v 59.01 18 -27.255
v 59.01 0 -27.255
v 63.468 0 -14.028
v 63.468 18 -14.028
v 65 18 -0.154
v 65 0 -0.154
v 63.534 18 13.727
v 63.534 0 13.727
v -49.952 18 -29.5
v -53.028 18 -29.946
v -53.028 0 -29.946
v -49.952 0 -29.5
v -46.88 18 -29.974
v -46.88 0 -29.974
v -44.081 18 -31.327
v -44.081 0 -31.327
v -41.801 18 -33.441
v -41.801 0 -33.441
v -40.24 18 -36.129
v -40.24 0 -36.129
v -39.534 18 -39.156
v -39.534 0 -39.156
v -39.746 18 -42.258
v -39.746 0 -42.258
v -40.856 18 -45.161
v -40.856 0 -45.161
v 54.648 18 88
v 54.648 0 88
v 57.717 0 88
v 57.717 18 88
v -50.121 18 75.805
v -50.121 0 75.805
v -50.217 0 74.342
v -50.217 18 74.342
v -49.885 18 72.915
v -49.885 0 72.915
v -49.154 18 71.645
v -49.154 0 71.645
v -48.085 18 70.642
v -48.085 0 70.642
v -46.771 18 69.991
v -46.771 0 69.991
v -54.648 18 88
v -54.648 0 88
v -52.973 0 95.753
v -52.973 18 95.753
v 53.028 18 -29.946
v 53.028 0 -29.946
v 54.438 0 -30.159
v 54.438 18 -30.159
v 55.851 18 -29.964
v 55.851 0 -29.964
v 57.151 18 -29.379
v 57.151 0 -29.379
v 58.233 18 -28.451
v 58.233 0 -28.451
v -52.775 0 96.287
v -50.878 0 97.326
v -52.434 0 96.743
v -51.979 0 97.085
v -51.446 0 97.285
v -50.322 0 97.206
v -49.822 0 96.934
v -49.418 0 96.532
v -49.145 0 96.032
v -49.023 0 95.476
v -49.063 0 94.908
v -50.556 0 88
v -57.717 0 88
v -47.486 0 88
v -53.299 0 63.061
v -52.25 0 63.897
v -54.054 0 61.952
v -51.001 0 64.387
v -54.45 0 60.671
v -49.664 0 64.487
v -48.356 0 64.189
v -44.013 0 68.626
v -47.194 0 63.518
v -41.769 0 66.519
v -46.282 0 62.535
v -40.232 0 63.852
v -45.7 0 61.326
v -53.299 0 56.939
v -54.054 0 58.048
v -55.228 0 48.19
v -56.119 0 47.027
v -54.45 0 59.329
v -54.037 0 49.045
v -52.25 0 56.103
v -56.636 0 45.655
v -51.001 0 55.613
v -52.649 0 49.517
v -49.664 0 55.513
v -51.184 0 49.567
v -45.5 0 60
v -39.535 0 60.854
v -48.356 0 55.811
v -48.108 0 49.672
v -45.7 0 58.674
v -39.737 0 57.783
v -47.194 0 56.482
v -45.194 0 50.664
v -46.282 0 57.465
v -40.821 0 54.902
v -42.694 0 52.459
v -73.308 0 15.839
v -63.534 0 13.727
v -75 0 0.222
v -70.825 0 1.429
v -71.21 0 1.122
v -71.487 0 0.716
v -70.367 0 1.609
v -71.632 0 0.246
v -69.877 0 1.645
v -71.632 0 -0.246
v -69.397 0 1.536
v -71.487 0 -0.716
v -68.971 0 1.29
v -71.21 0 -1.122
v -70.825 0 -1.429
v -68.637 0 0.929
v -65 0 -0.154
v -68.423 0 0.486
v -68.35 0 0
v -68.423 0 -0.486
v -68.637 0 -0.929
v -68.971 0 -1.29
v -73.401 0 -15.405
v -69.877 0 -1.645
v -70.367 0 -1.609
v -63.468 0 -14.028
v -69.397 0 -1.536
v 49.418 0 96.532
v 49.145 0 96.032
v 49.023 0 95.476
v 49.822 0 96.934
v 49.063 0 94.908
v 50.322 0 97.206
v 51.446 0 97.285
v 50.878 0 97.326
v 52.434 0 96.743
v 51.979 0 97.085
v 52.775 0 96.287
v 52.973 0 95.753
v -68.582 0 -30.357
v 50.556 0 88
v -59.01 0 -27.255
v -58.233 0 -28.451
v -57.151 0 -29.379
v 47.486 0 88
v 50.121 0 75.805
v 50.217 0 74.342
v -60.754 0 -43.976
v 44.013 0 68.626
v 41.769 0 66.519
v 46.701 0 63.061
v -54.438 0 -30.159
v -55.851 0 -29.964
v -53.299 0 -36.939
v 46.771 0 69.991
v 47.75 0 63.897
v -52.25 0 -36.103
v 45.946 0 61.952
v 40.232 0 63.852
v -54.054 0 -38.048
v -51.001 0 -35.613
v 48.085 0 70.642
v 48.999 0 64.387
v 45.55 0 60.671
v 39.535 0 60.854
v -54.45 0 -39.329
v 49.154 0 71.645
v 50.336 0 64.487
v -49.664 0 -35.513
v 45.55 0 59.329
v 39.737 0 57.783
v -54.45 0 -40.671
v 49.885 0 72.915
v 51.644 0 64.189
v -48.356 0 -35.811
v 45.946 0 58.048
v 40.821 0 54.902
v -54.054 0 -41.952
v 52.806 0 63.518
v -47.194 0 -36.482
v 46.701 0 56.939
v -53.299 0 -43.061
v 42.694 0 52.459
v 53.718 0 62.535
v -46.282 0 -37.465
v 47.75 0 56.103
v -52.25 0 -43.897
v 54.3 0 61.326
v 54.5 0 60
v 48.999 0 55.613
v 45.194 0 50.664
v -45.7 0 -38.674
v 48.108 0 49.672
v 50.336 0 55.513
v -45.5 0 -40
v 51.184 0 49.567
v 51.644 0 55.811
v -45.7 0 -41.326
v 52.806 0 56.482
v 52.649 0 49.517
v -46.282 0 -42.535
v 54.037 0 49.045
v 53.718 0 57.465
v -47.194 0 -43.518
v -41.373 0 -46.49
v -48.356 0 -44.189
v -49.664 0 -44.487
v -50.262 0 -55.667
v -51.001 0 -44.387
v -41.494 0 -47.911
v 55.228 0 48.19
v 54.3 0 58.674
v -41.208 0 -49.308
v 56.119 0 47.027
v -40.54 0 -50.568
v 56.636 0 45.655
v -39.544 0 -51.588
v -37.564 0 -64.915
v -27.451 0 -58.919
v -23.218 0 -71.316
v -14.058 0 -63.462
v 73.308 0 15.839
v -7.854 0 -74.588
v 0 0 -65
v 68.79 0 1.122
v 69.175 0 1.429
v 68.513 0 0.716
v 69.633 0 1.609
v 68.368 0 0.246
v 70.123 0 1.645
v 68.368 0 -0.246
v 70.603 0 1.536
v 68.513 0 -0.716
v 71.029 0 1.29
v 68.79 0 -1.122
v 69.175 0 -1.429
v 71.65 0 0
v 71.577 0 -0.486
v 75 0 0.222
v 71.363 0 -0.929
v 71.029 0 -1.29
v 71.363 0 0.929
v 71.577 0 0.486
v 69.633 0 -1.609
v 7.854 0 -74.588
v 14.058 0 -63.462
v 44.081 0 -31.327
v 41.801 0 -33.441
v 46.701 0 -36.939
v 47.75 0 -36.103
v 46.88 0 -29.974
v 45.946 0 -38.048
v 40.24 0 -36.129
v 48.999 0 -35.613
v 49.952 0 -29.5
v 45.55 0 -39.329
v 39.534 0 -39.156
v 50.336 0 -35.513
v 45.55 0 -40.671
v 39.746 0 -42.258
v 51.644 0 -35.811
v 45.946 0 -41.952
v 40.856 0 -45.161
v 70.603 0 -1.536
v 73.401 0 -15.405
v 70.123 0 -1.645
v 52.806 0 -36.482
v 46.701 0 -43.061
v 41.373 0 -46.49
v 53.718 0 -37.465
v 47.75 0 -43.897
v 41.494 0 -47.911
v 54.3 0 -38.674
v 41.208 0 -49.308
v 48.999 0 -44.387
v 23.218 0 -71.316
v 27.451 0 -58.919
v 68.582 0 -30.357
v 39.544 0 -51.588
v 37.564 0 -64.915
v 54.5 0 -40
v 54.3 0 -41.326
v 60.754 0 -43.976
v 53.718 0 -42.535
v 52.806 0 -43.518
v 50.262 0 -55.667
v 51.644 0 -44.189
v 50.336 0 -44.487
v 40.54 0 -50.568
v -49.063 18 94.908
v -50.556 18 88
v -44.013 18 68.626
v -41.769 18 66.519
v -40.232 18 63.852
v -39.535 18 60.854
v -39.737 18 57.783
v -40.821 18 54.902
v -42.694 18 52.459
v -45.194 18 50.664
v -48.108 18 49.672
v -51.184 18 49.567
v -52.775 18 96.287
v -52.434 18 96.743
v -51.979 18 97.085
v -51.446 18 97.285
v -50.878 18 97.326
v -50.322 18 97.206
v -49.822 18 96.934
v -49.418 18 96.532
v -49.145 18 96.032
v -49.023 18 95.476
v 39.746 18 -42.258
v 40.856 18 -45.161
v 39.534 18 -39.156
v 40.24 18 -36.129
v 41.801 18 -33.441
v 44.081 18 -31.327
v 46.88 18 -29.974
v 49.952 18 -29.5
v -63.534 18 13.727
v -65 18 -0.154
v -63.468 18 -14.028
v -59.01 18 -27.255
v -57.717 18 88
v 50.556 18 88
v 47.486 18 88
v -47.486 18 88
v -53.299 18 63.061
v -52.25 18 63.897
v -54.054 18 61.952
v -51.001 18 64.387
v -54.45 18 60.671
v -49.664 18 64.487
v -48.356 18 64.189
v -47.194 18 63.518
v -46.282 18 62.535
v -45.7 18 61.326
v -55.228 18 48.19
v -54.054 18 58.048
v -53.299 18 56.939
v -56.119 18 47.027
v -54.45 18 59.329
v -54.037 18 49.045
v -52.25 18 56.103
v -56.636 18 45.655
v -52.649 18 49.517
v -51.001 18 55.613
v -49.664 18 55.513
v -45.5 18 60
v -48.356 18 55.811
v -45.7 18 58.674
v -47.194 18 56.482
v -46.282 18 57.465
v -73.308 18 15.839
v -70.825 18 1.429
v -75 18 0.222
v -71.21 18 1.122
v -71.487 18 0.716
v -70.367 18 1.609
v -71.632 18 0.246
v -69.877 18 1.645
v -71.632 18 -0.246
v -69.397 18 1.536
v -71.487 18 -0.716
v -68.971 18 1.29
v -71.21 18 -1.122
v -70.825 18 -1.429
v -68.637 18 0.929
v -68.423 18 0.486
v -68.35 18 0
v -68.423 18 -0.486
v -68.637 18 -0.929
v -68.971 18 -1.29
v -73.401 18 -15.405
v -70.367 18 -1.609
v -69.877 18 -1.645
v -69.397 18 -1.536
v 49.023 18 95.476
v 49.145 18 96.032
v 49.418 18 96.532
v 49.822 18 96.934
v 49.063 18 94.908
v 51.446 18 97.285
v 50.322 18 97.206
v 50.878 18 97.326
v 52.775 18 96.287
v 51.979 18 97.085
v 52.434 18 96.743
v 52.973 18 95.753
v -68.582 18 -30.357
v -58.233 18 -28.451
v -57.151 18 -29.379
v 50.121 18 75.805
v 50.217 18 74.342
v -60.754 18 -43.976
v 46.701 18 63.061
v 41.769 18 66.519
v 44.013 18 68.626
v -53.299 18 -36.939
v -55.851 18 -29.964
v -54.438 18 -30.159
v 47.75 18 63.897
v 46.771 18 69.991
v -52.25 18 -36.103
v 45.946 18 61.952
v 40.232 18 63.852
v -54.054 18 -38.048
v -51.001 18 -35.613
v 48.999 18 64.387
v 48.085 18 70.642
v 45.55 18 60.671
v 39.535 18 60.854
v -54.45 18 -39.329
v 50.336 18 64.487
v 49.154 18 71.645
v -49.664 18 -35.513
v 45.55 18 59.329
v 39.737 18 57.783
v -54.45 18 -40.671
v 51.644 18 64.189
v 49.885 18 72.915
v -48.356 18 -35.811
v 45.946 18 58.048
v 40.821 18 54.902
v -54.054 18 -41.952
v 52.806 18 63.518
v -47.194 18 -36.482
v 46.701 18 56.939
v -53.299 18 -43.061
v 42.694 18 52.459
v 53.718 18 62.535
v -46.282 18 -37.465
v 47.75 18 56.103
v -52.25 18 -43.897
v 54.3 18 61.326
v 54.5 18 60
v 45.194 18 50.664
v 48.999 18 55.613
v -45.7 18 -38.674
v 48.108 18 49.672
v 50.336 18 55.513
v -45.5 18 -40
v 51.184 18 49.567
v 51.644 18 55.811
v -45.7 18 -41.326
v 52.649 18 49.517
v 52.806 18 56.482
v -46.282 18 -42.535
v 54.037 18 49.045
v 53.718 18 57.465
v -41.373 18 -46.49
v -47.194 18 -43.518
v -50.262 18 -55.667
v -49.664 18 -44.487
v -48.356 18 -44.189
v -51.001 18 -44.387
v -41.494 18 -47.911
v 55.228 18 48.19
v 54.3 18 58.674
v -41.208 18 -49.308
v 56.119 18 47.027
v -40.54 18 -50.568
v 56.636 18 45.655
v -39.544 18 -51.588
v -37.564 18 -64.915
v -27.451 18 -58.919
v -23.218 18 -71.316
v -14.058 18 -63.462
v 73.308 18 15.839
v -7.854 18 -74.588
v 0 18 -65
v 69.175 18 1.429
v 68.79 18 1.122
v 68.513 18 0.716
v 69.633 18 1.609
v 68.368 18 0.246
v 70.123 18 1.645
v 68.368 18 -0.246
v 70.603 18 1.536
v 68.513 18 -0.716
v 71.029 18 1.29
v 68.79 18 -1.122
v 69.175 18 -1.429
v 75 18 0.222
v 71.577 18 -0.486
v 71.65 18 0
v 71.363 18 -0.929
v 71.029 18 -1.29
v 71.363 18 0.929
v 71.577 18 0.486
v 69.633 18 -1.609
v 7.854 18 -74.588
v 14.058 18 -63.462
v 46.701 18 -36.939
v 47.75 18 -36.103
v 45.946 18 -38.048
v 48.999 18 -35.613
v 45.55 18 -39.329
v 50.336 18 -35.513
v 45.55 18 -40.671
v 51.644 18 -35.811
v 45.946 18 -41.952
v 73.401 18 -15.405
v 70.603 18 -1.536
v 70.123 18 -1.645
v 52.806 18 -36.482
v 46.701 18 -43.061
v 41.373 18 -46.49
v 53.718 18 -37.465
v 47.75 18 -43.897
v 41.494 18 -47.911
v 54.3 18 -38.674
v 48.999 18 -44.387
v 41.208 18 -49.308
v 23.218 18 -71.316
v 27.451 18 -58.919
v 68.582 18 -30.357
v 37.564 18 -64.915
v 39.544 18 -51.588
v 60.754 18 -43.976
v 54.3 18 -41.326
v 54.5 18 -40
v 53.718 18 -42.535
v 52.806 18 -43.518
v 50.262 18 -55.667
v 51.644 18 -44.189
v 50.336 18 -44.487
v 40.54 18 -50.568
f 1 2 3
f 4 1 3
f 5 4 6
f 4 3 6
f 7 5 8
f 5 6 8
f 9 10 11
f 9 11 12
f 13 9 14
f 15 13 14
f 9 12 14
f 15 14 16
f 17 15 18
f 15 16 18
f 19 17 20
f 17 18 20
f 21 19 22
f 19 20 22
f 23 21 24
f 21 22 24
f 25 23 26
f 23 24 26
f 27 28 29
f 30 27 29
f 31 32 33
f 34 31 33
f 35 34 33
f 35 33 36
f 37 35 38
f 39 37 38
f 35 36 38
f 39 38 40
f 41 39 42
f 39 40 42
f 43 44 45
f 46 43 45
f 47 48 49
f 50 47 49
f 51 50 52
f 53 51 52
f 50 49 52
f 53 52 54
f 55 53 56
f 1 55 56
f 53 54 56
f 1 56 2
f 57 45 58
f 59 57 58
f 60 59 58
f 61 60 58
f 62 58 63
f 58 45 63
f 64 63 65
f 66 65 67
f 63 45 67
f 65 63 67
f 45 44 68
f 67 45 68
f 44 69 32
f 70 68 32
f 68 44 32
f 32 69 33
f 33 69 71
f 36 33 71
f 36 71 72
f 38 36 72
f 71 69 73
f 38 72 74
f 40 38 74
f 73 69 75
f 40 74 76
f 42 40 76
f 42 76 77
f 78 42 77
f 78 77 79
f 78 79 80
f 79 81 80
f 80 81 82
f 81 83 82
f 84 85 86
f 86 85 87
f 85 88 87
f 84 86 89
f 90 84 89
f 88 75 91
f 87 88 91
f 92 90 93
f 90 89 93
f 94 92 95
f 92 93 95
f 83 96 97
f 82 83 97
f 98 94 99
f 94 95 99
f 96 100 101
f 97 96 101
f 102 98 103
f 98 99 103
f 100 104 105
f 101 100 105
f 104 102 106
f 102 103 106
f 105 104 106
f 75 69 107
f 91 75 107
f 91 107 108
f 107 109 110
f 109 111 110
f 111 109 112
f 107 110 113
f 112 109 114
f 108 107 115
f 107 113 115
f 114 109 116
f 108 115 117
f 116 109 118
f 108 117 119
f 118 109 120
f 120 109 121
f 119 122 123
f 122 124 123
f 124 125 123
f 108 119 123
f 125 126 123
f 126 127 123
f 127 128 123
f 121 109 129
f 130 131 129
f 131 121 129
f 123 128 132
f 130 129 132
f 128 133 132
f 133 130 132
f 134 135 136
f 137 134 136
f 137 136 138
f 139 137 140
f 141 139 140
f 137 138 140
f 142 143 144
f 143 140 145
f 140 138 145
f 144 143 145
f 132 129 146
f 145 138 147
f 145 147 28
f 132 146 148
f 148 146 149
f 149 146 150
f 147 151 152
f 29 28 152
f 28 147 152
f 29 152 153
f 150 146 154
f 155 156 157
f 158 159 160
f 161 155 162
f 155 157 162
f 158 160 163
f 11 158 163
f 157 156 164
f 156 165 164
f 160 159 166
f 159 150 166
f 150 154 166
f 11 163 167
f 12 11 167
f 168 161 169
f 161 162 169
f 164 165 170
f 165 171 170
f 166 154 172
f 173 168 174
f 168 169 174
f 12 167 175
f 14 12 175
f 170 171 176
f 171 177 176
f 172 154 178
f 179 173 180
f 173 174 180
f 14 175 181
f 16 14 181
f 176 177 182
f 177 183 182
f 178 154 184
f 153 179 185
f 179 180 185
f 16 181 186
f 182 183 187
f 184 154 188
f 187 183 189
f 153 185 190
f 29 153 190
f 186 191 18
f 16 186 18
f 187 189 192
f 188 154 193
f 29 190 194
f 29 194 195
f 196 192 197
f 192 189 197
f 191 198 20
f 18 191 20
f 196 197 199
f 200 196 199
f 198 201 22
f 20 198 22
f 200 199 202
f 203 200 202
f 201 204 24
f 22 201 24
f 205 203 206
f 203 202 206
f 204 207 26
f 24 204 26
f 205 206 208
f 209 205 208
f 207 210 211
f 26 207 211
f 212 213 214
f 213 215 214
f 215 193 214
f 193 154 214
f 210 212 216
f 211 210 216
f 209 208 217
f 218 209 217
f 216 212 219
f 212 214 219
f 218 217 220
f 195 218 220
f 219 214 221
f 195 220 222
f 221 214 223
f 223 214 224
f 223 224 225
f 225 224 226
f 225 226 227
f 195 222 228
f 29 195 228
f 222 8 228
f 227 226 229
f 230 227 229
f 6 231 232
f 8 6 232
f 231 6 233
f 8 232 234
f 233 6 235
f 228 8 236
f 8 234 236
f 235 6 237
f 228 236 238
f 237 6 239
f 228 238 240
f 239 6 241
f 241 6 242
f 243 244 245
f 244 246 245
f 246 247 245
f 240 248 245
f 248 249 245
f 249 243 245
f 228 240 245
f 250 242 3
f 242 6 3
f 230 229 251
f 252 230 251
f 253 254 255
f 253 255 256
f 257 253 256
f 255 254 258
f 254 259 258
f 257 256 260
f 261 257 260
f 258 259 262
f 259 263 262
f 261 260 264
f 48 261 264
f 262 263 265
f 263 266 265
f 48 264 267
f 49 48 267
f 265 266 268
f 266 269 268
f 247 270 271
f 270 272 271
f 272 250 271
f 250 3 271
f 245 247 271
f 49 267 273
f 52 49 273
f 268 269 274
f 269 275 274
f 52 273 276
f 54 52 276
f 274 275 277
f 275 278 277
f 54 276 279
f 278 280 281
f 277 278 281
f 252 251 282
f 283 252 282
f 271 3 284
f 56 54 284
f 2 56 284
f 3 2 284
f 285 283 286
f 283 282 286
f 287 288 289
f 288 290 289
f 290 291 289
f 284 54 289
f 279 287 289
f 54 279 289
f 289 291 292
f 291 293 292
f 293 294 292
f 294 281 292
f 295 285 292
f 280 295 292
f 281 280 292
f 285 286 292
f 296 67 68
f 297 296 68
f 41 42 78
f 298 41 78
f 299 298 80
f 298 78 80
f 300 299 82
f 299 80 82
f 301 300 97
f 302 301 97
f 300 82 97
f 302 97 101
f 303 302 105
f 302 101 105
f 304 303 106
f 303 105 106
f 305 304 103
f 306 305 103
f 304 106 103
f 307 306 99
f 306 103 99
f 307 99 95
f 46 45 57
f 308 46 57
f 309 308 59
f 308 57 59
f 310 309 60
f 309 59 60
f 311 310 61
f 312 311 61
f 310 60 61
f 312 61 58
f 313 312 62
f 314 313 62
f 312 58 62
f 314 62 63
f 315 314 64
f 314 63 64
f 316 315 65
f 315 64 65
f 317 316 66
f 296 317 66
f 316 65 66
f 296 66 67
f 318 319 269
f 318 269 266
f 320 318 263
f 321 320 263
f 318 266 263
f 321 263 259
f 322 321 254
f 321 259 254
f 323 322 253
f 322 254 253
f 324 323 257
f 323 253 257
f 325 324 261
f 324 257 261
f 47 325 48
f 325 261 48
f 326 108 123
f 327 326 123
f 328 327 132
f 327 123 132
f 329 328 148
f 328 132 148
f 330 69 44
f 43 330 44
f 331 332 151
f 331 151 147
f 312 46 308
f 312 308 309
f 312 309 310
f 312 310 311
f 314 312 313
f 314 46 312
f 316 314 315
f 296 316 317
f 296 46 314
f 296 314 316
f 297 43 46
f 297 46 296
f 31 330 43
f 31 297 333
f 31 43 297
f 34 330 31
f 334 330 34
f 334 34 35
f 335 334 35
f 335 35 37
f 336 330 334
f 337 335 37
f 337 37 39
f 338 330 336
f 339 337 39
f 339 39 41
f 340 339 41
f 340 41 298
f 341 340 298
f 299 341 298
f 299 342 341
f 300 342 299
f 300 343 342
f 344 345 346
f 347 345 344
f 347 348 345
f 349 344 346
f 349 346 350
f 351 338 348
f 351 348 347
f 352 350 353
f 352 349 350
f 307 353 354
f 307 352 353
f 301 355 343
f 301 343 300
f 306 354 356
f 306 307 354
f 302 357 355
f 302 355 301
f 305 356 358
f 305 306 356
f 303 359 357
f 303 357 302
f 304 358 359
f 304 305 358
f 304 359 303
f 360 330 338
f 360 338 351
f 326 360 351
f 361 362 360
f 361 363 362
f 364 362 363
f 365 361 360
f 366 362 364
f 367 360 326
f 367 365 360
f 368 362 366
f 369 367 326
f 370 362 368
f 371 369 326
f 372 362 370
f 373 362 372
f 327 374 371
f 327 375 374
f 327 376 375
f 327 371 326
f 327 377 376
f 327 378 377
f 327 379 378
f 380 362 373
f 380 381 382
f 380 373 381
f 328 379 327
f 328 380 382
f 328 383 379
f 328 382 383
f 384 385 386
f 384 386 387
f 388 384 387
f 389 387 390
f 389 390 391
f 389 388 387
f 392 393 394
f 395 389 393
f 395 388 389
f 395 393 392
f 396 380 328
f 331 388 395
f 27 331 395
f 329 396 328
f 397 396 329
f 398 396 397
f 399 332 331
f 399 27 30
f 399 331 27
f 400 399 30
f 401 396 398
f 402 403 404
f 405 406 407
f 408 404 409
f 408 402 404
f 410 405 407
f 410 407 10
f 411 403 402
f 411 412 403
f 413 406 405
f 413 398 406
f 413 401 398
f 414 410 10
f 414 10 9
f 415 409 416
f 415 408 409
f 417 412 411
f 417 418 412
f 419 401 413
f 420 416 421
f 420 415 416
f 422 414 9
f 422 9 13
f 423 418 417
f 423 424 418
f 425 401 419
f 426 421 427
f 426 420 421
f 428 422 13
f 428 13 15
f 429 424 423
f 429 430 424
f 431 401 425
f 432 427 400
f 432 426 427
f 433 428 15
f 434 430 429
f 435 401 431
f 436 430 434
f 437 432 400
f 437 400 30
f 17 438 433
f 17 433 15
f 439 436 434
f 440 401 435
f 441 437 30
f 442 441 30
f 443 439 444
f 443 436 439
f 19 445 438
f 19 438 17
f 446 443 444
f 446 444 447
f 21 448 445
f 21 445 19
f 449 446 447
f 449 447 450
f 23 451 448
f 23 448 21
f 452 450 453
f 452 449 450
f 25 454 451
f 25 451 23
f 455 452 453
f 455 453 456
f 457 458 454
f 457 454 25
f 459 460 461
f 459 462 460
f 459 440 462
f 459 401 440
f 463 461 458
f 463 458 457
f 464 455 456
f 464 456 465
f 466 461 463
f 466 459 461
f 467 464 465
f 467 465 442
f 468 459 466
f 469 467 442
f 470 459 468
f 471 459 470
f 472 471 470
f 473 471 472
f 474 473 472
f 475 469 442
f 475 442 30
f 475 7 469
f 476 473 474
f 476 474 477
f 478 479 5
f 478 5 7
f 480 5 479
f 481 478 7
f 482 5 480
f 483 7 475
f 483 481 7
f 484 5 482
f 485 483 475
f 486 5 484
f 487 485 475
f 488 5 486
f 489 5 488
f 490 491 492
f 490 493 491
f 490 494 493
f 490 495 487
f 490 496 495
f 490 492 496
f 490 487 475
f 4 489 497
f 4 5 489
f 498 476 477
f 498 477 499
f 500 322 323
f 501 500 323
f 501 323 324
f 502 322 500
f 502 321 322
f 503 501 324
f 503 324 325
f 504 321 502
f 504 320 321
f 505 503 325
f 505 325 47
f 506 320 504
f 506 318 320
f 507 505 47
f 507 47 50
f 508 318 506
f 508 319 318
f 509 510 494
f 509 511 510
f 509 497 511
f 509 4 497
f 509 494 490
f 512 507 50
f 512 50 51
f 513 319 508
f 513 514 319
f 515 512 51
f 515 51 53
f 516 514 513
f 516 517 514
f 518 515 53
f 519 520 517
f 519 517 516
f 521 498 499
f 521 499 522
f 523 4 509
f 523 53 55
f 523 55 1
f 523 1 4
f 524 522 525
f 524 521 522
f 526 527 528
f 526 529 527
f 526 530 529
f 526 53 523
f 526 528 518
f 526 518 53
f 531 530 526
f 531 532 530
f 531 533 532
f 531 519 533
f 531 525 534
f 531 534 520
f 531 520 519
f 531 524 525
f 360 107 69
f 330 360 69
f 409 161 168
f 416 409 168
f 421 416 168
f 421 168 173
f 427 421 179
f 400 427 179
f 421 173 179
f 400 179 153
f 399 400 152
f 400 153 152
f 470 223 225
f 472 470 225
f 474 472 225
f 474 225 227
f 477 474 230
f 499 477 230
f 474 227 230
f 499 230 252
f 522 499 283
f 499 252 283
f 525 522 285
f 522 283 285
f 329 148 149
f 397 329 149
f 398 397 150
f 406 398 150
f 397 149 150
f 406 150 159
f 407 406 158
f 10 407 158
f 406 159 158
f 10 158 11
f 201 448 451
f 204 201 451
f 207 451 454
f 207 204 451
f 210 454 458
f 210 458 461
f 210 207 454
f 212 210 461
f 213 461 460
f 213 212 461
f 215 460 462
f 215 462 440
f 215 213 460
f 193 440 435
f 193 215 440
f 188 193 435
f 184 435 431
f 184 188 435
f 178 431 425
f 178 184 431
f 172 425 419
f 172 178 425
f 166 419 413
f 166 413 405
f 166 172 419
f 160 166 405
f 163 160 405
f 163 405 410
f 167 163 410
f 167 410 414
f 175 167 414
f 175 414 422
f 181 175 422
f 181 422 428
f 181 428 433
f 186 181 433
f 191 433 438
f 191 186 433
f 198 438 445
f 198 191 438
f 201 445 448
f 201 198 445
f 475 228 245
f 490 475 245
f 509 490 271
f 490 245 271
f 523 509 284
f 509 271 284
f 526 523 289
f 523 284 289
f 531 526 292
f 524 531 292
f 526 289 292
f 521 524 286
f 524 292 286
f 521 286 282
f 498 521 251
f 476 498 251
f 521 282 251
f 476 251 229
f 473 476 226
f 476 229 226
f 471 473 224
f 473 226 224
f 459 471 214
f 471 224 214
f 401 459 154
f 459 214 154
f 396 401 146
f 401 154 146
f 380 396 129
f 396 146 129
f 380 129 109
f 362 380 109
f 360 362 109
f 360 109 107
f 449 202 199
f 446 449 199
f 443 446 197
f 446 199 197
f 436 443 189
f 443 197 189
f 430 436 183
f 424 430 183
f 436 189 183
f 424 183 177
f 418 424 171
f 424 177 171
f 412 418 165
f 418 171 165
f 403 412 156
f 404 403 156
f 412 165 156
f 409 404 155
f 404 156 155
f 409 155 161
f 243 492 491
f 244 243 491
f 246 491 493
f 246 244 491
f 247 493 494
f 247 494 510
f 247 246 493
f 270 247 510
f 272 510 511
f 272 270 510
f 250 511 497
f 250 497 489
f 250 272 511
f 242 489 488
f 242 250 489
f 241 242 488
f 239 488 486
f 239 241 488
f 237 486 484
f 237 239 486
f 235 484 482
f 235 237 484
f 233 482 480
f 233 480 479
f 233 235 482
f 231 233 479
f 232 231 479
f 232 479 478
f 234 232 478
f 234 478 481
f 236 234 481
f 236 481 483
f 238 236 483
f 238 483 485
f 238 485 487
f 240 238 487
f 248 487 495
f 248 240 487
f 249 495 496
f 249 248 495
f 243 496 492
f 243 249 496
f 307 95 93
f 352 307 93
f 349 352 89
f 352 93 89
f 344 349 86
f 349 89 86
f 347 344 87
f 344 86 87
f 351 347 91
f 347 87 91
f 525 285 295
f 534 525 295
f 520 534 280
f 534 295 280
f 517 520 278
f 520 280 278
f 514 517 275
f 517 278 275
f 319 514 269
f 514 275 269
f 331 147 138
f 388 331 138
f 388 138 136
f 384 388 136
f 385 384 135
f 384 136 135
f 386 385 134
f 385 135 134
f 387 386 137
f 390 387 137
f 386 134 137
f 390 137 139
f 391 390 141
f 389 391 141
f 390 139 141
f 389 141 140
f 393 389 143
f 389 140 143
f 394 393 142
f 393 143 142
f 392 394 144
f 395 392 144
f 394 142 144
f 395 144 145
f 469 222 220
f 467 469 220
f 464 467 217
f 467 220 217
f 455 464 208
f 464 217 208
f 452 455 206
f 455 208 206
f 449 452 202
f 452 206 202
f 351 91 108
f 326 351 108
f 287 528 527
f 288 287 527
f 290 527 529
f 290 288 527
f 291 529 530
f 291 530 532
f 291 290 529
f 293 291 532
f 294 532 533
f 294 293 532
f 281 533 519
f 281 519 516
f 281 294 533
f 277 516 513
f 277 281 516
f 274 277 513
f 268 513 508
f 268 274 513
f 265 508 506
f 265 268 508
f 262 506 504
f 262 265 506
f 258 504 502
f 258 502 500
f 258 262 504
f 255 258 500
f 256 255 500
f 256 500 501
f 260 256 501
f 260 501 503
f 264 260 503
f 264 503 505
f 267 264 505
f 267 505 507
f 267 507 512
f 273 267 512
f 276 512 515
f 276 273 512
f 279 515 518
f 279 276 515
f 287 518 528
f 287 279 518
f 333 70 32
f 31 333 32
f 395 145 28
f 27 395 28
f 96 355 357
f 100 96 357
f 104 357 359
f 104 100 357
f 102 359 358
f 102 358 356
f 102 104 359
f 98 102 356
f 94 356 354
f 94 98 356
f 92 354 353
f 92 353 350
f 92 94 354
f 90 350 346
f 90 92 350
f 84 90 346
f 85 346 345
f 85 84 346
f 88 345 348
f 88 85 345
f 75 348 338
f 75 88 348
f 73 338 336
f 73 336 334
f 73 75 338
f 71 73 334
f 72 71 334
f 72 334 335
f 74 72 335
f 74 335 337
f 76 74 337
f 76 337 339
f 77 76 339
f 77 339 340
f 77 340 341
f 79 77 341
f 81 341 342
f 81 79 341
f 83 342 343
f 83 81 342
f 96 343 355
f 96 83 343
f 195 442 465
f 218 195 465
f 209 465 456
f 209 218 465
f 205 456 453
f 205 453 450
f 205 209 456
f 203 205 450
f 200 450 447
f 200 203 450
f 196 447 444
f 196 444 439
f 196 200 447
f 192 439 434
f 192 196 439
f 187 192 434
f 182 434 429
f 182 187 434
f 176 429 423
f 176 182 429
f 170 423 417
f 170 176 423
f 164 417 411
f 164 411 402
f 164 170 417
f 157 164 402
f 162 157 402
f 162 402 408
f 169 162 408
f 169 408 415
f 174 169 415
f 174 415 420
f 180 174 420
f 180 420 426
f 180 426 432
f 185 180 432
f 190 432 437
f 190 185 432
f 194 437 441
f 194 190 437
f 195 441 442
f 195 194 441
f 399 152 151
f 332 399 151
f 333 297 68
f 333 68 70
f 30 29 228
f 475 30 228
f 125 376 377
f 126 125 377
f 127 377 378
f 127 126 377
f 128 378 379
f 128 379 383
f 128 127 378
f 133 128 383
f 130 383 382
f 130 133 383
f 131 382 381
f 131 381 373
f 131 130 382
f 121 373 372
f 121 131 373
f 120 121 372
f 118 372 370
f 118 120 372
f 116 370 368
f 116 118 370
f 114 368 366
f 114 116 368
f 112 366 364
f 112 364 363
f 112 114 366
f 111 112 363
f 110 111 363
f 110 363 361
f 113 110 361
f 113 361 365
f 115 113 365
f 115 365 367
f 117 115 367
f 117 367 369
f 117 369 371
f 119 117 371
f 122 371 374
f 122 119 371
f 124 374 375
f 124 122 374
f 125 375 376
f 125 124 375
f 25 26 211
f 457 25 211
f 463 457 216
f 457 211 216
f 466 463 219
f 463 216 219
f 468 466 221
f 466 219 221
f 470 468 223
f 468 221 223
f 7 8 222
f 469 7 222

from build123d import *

# Parameters (mm, degrees)
SKETCH1_R           = 4.5
SKETCH1_R_2         = 1.65
BOSS_EXTRUDE1_DEPTH = 18


with BuildPart() as part:
    # Sketch1 → Boss-Extrude1 (new body)
    with BuildSketch(Plane(origin=(0, 0, 0), x_dir=(1, 0, 0), z_dir=(0, 1, 0))):
        with BuildLine():
            Line((-57.71713569, -88), (-54.647909803, -88))
            Line((-54.647909803, -88), (-52.972729242, -95.753217476))
            ThreePointArc((-52.972729242, -95.753217476), (-50.595460167, -97.285729058), (-49.062948585, -94.908459984))
            Line((-49.062948585, -94.908459984), (-50.555608621, -88))
            Line((-50.555608621, -88), (-47.486382735, -88))
            Line((-47.486382735, -88), (-50.121259231, -75.805033701))
            ThreePointArc((-50.121259231, -75.805033701), (-49.566331597, -72.252851185), (-46.771441988, -69.991316888))
            ThreePointArc((-46.771441988, -69.991316888), (-39.736825778, -57.782511582), (-51.184371295, -49.567010753))
            ThreePointArc((-51.184371295, -49.567010753), (-54.663630533, -48.661085559), (-56.635583446, -45.654867501))
            Line((-56.635583446, -45.654867501), (-63.533935661, -13.727309256))
            ThreePointArc((-63.533935661, -13.727309256), (-64.607519764, 7.132207931), (-59.0097537, 27.255255792))
            ThreePointArc((-59.0097537, 27.255255792), (-56.52196193, 29.718486659), (-53.028431594, 29.94621454))
            ThreePointArc((-53.028431594, 29.94621454), (-41.800877501, 33.440702001), (-40.856206486, 45.161495924))
            ThreePointArc((-40.856206486, 45.161495924), (-41.400905456, 48.61980725), (-39.543854024, 51.587630387))
            ThreePointArc((-39.543854024, 51.587630387), (0, 65), (39.543854024, 51.587630387))
            ThreePointArc((39.543854024, 51.587630387), (41.400905456, 48.61980725), (40.856206486, 45.161495924))
            ThreePointArc((40.856206486, 45.161495924), (41.800877501, 33.440702001), (53.028431594, 29.94621454))
            ThreePointArc((53.028431594, 29.94621454), (56.52196193, 29.718486659), (59.0097537, 27.255255792))
            ThreePointArc((59.0097537, 27.255255792), (64.607519764, 7.132207931), (63.533935661, -13.727309256))
            Line((63.533935661, -13.727309256), (56.635583446, -45.654867501))
            ThreePointArc((56.635583446, -45.654867501), (54.663630533, -48.661085559), (51.184371295, -49.567010753))
            ThreePointArc((51.184371295, -49.567010753), (39.736825778, -57.782511582), (46.771441988, -69.991316888))
            ThreePointArc((46.771441988, -69.991316888), (49.566331597, -72.252851185), (50.121259231, -75.805033701))
            Line((50.121259231, -75.805033701), (47.486382735, -88))
            Line((47.486382735, -88), (50.555608621, -88))
            Line((50.555608621, -88), (49.062948585, -94.908459984))
            ThreePointArc((49.062948585, -94.908459984), (50.595460167, -97.285729058), (52.972729242, -95.753217476))
            Line((52.972729242, -95.753217476), (54.647909803, -88))
            Line((54.647909803, -88), (57.71713569, -88))
            Line((57.71713569, -88), (73.308387301, -15.839202988))
            ThreePointArc((73.308387301, -15.839202988), (0, 75), (-73.308387301, -15.839202988))
            Line((-73.308387301, -15.839202988), (-57.71713569, -88))
        make_face()
        with Locations((-50, -60)):
            Circle(SKETCH1_R, mode=Mode.SUBTRACT)
        with Locations((50, -60)):
            Circle(SKETCH1_R, mode=Mode.SUBTRACT)
        with Locations((70, 0)):
            Circle(SKETCH1_R_2, mode=Mode.SUBTRACT)
        with Locations((50, 40)):
            Circle(SKETCH1_R, mode=Mode.SUBTRACT)
        with Locations((-50, 40)):
            Circle(SKETCH1_R, mode=Mode.SUBTRACT)
        with Locations((-70, 0)):
            Circle(SKETCH1_R_2, mode=Mode.SUBTRACT)
    extrude(amount=BOSS_EXTRUDE1_DEPTH)


solid = part.part
